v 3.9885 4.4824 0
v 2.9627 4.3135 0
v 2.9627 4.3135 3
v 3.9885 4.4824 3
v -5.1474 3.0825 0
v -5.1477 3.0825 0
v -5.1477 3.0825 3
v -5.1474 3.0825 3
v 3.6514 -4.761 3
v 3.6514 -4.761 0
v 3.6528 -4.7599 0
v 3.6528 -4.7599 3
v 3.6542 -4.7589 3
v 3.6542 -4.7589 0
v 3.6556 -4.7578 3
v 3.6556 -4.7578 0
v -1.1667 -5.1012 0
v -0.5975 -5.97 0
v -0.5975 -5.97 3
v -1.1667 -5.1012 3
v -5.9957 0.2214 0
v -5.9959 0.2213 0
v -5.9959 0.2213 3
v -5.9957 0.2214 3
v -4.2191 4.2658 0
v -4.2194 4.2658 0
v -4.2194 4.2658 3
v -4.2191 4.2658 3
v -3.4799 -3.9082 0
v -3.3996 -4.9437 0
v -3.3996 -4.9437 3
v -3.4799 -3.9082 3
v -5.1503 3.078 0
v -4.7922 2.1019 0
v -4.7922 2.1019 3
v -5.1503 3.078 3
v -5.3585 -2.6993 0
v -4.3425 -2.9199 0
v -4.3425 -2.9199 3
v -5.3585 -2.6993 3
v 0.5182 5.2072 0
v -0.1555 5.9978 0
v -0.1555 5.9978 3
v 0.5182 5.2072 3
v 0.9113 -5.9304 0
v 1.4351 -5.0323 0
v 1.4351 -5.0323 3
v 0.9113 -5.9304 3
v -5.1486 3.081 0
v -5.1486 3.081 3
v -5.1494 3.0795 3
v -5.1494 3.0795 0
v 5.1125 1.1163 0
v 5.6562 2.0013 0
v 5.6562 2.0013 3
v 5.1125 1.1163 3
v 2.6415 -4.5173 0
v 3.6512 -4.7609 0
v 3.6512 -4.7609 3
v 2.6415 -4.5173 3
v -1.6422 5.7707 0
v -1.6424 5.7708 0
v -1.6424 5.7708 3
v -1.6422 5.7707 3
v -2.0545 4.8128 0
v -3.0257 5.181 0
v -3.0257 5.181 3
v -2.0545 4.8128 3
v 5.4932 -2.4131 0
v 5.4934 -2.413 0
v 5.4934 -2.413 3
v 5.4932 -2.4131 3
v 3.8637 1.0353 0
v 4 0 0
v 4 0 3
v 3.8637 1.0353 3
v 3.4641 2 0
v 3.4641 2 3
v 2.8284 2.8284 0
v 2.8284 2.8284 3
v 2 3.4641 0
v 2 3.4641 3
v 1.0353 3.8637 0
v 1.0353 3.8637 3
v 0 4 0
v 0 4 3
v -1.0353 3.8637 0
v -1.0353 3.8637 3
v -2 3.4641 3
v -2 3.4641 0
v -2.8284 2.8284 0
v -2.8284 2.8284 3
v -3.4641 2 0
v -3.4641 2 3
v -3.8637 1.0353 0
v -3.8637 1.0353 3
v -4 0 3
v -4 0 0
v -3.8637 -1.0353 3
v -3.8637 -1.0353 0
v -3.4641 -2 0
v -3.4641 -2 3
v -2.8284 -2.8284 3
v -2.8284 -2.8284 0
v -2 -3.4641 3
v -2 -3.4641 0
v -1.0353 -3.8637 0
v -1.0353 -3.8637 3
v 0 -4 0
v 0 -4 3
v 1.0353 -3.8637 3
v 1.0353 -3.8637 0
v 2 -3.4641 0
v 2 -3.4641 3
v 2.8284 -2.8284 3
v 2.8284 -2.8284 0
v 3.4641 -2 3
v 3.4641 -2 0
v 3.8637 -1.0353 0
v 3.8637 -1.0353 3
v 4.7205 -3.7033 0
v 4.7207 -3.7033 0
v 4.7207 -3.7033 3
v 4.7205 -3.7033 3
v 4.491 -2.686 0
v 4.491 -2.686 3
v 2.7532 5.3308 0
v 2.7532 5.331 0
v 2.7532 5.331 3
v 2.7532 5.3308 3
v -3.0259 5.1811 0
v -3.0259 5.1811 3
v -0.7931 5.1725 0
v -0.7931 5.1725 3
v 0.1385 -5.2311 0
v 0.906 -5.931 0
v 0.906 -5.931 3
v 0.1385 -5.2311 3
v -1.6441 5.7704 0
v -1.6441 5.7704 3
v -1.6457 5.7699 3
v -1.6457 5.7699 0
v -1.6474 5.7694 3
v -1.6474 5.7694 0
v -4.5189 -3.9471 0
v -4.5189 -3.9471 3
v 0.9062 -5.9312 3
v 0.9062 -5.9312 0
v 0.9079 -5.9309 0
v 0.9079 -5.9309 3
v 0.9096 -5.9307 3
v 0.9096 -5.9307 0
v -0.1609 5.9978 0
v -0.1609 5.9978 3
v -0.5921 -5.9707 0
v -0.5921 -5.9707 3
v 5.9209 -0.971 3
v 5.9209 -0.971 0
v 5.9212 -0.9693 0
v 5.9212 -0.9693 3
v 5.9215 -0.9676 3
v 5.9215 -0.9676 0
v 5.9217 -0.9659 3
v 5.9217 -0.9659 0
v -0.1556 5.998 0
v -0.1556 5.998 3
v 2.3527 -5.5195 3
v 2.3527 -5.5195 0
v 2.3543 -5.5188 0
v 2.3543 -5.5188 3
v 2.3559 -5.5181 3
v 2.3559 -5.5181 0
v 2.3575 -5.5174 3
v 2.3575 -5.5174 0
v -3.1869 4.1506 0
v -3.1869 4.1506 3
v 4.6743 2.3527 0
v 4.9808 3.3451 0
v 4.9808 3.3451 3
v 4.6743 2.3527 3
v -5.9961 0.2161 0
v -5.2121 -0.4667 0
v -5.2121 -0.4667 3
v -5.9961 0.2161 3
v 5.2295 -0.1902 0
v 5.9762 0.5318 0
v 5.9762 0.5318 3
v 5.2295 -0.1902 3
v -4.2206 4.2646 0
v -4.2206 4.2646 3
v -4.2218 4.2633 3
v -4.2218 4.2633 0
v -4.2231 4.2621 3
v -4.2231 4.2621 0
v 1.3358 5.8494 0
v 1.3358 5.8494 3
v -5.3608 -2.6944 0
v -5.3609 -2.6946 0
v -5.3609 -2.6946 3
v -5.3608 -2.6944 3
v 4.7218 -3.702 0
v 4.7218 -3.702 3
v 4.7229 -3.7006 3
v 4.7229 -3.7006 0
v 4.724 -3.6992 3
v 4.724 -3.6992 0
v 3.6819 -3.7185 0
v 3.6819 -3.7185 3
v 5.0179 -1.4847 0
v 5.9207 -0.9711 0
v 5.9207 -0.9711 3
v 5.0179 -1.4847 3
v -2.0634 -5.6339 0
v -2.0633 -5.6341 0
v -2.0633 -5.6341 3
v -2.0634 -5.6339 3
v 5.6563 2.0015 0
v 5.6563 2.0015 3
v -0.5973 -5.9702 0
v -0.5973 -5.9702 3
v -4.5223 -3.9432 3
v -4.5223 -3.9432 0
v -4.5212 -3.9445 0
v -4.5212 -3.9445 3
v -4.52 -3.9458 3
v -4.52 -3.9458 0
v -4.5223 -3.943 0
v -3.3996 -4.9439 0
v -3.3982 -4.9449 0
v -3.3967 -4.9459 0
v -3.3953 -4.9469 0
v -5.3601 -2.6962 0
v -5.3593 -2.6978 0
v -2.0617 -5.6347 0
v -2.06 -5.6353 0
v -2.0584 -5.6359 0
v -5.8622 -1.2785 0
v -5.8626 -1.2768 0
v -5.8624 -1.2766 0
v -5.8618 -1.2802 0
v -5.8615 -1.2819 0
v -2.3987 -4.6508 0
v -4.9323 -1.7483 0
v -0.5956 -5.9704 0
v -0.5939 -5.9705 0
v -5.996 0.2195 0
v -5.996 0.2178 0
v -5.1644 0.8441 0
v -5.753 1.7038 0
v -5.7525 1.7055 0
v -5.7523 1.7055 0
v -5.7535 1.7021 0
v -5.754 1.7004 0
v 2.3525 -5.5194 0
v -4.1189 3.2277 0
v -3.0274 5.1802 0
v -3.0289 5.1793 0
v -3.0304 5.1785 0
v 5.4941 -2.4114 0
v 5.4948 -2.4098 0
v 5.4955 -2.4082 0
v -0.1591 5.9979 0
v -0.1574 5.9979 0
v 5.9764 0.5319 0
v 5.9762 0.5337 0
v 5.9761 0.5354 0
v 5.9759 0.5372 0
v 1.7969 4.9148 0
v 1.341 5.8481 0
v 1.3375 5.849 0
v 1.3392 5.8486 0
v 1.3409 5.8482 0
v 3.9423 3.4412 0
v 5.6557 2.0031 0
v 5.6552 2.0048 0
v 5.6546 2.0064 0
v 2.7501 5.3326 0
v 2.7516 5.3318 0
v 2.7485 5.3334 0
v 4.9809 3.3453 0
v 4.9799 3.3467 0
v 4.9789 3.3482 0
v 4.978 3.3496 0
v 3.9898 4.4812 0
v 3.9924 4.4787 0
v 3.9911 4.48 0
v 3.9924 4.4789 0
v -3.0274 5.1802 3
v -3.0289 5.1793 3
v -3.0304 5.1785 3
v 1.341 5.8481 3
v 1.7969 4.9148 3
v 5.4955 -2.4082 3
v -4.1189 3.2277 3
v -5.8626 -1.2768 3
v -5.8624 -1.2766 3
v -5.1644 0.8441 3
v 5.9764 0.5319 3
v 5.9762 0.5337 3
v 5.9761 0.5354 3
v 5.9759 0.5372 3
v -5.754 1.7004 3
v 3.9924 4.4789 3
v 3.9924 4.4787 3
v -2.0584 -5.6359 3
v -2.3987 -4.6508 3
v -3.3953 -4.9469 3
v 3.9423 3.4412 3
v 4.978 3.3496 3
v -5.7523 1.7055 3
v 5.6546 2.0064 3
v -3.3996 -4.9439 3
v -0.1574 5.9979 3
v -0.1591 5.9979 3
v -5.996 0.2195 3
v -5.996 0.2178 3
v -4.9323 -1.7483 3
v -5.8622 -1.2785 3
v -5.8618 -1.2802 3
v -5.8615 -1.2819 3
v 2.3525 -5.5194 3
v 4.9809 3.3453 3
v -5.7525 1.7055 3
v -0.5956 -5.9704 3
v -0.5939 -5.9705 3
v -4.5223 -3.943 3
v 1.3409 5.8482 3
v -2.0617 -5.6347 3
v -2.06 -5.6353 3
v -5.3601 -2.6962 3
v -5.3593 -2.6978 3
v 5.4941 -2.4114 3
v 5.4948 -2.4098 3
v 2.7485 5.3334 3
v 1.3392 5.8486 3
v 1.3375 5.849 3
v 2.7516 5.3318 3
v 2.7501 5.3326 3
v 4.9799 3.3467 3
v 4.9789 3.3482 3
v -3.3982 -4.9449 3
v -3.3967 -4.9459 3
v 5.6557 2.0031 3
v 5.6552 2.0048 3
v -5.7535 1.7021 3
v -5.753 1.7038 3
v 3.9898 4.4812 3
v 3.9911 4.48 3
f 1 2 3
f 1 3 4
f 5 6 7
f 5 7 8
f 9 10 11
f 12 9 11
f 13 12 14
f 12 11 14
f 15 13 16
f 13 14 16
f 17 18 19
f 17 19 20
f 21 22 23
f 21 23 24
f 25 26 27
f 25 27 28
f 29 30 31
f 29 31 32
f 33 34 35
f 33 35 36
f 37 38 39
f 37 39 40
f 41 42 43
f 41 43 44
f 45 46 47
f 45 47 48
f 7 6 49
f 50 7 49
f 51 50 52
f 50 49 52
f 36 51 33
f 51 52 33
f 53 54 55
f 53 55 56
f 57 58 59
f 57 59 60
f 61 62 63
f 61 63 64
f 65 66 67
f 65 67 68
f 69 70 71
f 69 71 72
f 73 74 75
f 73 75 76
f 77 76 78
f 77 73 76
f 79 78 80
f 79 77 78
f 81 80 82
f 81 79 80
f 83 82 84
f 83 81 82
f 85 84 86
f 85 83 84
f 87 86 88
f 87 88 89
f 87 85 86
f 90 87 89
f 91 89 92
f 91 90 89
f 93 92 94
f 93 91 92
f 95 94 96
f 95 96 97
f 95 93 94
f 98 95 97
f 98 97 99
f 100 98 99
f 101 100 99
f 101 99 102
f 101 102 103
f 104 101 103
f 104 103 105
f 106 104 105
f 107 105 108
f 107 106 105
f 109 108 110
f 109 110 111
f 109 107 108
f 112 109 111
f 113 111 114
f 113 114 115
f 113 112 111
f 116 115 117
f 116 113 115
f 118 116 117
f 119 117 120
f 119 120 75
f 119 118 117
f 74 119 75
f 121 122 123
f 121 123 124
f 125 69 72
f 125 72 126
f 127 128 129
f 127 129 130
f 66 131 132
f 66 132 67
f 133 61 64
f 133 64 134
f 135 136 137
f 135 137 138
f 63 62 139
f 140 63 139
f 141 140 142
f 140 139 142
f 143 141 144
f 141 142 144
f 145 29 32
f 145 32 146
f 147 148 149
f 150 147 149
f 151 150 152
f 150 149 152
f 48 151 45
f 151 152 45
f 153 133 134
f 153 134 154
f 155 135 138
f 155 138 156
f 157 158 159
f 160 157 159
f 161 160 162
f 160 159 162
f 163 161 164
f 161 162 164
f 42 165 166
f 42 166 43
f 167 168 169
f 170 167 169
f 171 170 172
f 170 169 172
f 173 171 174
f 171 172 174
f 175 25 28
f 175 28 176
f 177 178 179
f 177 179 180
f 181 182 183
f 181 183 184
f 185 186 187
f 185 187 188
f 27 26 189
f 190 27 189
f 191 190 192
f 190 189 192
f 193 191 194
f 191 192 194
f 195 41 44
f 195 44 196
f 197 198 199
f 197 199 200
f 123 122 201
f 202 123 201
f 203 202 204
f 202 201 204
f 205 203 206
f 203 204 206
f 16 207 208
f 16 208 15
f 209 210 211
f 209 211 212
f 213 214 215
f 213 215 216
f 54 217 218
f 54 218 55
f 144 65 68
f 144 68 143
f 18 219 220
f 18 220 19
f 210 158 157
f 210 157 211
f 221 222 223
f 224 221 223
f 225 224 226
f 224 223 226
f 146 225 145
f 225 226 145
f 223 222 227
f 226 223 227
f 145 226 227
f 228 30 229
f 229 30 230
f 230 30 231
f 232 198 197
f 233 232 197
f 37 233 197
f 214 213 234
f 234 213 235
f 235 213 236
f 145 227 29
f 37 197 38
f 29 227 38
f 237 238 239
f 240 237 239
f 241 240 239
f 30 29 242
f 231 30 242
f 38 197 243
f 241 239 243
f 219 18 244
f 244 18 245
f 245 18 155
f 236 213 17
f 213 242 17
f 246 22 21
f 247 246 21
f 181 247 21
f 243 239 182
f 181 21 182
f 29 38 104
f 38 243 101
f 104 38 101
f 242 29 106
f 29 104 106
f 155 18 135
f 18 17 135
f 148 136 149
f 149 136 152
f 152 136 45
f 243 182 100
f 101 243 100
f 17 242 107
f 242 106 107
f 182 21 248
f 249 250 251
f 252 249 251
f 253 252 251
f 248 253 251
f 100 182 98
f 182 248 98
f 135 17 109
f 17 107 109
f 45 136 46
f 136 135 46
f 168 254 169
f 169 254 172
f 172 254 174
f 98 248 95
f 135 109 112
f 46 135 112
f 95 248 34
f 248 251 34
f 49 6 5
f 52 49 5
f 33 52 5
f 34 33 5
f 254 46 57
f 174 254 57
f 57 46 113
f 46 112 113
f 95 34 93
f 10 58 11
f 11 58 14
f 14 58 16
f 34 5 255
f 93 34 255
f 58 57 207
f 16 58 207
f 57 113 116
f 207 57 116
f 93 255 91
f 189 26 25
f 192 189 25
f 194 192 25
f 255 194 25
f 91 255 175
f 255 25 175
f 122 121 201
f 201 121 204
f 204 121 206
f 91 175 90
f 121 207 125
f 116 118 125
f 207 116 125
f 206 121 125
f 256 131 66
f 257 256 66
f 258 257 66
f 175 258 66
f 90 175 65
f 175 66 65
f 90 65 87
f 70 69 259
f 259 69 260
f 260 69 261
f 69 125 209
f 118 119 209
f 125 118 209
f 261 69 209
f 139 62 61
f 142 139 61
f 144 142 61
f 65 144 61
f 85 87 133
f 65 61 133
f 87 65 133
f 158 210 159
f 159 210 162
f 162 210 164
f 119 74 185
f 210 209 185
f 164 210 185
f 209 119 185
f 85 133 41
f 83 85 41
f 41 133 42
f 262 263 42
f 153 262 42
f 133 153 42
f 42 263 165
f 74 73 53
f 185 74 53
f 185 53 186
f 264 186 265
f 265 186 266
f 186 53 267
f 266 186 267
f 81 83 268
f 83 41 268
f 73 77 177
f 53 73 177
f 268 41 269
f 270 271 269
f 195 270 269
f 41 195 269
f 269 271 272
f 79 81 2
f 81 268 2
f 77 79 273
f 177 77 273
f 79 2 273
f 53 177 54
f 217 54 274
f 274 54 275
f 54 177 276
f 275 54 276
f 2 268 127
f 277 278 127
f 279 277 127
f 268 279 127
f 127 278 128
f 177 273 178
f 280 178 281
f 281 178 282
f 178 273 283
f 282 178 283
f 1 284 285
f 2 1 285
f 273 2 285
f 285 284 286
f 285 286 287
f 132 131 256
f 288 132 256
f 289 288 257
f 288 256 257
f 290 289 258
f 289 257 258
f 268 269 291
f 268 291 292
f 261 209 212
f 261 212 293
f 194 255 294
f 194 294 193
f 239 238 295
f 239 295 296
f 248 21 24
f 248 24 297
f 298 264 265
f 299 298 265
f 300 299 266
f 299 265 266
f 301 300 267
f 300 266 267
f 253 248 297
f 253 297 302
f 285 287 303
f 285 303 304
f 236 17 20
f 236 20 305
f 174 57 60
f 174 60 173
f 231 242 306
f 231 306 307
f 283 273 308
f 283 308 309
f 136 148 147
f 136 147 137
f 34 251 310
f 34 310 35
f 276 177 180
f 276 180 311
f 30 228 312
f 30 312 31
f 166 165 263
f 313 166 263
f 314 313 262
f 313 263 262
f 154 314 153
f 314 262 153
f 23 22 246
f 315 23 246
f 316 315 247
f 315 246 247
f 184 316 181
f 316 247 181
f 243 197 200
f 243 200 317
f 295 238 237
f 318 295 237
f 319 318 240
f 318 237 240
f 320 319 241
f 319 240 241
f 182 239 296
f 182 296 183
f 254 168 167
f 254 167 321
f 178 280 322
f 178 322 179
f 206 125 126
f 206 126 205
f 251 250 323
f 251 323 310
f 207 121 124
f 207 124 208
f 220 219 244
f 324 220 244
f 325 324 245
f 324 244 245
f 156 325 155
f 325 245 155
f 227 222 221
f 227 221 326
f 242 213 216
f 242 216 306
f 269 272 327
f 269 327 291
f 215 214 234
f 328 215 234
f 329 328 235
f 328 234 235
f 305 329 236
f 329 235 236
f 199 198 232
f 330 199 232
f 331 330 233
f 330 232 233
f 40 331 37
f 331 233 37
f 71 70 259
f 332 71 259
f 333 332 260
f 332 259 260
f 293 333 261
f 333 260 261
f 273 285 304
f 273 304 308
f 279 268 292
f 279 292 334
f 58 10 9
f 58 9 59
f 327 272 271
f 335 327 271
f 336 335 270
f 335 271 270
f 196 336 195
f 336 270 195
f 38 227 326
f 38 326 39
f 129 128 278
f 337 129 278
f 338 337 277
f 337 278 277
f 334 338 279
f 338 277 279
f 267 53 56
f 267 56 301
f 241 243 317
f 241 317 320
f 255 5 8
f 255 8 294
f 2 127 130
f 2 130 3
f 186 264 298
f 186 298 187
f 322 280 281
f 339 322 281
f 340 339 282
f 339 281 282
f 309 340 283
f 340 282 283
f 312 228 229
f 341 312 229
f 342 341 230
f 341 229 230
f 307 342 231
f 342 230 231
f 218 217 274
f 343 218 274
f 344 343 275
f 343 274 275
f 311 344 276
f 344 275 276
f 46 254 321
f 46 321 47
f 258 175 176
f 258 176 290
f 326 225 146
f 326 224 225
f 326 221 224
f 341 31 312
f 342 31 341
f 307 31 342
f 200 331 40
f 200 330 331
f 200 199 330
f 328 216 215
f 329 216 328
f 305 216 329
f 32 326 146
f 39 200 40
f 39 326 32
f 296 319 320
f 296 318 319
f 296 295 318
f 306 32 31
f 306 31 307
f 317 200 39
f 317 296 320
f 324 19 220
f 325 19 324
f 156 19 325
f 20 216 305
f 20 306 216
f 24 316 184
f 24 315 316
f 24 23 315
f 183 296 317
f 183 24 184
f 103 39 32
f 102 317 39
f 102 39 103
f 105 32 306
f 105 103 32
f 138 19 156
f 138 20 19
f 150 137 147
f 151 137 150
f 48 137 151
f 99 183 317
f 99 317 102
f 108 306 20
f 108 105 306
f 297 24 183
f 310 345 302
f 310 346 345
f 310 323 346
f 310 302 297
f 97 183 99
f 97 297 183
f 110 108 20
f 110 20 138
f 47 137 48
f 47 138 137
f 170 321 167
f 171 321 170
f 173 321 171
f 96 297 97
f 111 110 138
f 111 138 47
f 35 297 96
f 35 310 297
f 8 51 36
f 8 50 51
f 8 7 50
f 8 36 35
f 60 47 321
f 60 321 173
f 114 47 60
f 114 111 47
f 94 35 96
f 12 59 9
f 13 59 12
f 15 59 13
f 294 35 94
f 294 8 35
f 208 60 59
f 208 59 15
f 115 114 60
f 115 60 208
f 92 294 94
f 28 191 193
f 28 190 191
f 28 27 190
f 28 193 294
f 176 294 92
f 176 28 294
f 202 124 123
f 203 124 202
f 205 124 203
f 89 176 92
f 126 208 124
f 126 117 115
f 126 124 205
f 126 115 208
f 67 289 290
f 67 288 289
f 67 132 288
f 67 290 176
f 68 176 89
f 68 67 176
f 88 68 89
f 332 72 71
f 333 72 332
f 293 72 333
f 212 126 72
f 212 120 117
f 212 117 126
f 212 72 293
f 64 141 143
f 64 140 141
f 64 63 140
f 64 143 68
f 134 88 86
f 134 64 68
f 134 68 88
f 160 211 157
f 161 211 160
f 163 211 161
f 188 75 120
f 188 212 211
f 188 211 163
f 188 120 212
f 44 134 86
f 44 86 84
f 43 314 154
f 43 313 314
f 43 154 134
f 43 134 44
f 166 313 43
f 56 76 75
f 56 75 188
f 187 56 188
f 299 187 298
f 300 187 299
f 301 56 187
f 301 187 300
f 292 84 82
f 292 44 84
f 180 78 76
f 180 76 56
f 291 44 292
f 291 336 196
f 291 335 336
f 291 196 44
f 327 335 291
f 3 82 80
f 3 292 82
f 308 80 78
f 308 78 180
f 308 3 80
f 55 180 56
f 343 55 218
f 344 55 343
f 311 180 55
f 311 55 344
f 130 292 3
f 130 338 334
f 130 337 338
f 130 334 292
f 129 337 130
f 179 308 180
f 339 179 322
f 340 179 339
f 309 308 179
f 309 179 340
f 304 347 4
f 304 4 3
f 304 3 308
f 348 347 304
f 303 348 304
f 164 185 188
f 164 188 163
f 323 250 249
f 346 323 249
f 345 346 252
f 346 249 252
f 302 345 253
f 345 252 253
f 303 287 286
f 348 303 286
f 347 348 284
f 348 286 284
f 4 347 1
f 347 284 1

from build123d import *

# Parameters (mm, degrees)
ESQUISSE1_R                  = 6
ESQUISSE1_R_2                = 4
BOSS_EXTRU_1_DEPTH           = 3
ENL_V_START                  = -3
ENL_V_MAT_EXTRU_1_DEPTH      = 3
R_P_TITION_CIRCULAIRE1_COUNT = 25


with BuildPart() as part:
    # Esquisse1 → Boss.-Extru.1 (new body)
    with BuildSketch(Plane.XY):
        Circle(ESQUISSE1_R)
        Circle(ESQUISSE1_R_2, mode=Mode.SUBTRACT)
    extrude(amount=BOSS_EXTRU_1_DEPTH)

    # Esquisse2 → Enlèv. mat.-Extru.1 (cut)
    with BuildSketch(Plane.XY.offset(3).offset(ENL_V_START)):
        with BuildLine():
            Line((-1.642379627, 5.770839554), (-1.642202224, 5.770714571))
            Line((-1.642202224, 5.770714571), (-0.793081387, 5.17249337))
            Line((-0.793081387, 5.17249337), (-0.160864862, 5.997843154))
            ThreePointArc((-0.160864862, 5.997843154), (-0.908738318, 5.930783647), (-1.642379627, 5.770839554))
        make_face()
    enl_v_mat_extru_1 = extrude(amount=ENL_V_MAT_EXTRU_1_DEPTH, mode=Mode.SUBTRACT)

    # Répétition circulaire1: Enlèv. mat.-Extru.1 ×25 about axis
    r_p_tition_circulaire1_axis = Axis((0, 0, 0), (0, 0, 1))
    for i in range(1, R_P_TITION_CIRCULAIRE1_COUNT):
        add(enl_v_mat_extru_1.rotate(r_p_tition_circulaire1_axis, i * 360 / R_P_TITION_CIRCULAIRE1_COUNT), mode=Mode.SUBTRACT)


solid = part.part
